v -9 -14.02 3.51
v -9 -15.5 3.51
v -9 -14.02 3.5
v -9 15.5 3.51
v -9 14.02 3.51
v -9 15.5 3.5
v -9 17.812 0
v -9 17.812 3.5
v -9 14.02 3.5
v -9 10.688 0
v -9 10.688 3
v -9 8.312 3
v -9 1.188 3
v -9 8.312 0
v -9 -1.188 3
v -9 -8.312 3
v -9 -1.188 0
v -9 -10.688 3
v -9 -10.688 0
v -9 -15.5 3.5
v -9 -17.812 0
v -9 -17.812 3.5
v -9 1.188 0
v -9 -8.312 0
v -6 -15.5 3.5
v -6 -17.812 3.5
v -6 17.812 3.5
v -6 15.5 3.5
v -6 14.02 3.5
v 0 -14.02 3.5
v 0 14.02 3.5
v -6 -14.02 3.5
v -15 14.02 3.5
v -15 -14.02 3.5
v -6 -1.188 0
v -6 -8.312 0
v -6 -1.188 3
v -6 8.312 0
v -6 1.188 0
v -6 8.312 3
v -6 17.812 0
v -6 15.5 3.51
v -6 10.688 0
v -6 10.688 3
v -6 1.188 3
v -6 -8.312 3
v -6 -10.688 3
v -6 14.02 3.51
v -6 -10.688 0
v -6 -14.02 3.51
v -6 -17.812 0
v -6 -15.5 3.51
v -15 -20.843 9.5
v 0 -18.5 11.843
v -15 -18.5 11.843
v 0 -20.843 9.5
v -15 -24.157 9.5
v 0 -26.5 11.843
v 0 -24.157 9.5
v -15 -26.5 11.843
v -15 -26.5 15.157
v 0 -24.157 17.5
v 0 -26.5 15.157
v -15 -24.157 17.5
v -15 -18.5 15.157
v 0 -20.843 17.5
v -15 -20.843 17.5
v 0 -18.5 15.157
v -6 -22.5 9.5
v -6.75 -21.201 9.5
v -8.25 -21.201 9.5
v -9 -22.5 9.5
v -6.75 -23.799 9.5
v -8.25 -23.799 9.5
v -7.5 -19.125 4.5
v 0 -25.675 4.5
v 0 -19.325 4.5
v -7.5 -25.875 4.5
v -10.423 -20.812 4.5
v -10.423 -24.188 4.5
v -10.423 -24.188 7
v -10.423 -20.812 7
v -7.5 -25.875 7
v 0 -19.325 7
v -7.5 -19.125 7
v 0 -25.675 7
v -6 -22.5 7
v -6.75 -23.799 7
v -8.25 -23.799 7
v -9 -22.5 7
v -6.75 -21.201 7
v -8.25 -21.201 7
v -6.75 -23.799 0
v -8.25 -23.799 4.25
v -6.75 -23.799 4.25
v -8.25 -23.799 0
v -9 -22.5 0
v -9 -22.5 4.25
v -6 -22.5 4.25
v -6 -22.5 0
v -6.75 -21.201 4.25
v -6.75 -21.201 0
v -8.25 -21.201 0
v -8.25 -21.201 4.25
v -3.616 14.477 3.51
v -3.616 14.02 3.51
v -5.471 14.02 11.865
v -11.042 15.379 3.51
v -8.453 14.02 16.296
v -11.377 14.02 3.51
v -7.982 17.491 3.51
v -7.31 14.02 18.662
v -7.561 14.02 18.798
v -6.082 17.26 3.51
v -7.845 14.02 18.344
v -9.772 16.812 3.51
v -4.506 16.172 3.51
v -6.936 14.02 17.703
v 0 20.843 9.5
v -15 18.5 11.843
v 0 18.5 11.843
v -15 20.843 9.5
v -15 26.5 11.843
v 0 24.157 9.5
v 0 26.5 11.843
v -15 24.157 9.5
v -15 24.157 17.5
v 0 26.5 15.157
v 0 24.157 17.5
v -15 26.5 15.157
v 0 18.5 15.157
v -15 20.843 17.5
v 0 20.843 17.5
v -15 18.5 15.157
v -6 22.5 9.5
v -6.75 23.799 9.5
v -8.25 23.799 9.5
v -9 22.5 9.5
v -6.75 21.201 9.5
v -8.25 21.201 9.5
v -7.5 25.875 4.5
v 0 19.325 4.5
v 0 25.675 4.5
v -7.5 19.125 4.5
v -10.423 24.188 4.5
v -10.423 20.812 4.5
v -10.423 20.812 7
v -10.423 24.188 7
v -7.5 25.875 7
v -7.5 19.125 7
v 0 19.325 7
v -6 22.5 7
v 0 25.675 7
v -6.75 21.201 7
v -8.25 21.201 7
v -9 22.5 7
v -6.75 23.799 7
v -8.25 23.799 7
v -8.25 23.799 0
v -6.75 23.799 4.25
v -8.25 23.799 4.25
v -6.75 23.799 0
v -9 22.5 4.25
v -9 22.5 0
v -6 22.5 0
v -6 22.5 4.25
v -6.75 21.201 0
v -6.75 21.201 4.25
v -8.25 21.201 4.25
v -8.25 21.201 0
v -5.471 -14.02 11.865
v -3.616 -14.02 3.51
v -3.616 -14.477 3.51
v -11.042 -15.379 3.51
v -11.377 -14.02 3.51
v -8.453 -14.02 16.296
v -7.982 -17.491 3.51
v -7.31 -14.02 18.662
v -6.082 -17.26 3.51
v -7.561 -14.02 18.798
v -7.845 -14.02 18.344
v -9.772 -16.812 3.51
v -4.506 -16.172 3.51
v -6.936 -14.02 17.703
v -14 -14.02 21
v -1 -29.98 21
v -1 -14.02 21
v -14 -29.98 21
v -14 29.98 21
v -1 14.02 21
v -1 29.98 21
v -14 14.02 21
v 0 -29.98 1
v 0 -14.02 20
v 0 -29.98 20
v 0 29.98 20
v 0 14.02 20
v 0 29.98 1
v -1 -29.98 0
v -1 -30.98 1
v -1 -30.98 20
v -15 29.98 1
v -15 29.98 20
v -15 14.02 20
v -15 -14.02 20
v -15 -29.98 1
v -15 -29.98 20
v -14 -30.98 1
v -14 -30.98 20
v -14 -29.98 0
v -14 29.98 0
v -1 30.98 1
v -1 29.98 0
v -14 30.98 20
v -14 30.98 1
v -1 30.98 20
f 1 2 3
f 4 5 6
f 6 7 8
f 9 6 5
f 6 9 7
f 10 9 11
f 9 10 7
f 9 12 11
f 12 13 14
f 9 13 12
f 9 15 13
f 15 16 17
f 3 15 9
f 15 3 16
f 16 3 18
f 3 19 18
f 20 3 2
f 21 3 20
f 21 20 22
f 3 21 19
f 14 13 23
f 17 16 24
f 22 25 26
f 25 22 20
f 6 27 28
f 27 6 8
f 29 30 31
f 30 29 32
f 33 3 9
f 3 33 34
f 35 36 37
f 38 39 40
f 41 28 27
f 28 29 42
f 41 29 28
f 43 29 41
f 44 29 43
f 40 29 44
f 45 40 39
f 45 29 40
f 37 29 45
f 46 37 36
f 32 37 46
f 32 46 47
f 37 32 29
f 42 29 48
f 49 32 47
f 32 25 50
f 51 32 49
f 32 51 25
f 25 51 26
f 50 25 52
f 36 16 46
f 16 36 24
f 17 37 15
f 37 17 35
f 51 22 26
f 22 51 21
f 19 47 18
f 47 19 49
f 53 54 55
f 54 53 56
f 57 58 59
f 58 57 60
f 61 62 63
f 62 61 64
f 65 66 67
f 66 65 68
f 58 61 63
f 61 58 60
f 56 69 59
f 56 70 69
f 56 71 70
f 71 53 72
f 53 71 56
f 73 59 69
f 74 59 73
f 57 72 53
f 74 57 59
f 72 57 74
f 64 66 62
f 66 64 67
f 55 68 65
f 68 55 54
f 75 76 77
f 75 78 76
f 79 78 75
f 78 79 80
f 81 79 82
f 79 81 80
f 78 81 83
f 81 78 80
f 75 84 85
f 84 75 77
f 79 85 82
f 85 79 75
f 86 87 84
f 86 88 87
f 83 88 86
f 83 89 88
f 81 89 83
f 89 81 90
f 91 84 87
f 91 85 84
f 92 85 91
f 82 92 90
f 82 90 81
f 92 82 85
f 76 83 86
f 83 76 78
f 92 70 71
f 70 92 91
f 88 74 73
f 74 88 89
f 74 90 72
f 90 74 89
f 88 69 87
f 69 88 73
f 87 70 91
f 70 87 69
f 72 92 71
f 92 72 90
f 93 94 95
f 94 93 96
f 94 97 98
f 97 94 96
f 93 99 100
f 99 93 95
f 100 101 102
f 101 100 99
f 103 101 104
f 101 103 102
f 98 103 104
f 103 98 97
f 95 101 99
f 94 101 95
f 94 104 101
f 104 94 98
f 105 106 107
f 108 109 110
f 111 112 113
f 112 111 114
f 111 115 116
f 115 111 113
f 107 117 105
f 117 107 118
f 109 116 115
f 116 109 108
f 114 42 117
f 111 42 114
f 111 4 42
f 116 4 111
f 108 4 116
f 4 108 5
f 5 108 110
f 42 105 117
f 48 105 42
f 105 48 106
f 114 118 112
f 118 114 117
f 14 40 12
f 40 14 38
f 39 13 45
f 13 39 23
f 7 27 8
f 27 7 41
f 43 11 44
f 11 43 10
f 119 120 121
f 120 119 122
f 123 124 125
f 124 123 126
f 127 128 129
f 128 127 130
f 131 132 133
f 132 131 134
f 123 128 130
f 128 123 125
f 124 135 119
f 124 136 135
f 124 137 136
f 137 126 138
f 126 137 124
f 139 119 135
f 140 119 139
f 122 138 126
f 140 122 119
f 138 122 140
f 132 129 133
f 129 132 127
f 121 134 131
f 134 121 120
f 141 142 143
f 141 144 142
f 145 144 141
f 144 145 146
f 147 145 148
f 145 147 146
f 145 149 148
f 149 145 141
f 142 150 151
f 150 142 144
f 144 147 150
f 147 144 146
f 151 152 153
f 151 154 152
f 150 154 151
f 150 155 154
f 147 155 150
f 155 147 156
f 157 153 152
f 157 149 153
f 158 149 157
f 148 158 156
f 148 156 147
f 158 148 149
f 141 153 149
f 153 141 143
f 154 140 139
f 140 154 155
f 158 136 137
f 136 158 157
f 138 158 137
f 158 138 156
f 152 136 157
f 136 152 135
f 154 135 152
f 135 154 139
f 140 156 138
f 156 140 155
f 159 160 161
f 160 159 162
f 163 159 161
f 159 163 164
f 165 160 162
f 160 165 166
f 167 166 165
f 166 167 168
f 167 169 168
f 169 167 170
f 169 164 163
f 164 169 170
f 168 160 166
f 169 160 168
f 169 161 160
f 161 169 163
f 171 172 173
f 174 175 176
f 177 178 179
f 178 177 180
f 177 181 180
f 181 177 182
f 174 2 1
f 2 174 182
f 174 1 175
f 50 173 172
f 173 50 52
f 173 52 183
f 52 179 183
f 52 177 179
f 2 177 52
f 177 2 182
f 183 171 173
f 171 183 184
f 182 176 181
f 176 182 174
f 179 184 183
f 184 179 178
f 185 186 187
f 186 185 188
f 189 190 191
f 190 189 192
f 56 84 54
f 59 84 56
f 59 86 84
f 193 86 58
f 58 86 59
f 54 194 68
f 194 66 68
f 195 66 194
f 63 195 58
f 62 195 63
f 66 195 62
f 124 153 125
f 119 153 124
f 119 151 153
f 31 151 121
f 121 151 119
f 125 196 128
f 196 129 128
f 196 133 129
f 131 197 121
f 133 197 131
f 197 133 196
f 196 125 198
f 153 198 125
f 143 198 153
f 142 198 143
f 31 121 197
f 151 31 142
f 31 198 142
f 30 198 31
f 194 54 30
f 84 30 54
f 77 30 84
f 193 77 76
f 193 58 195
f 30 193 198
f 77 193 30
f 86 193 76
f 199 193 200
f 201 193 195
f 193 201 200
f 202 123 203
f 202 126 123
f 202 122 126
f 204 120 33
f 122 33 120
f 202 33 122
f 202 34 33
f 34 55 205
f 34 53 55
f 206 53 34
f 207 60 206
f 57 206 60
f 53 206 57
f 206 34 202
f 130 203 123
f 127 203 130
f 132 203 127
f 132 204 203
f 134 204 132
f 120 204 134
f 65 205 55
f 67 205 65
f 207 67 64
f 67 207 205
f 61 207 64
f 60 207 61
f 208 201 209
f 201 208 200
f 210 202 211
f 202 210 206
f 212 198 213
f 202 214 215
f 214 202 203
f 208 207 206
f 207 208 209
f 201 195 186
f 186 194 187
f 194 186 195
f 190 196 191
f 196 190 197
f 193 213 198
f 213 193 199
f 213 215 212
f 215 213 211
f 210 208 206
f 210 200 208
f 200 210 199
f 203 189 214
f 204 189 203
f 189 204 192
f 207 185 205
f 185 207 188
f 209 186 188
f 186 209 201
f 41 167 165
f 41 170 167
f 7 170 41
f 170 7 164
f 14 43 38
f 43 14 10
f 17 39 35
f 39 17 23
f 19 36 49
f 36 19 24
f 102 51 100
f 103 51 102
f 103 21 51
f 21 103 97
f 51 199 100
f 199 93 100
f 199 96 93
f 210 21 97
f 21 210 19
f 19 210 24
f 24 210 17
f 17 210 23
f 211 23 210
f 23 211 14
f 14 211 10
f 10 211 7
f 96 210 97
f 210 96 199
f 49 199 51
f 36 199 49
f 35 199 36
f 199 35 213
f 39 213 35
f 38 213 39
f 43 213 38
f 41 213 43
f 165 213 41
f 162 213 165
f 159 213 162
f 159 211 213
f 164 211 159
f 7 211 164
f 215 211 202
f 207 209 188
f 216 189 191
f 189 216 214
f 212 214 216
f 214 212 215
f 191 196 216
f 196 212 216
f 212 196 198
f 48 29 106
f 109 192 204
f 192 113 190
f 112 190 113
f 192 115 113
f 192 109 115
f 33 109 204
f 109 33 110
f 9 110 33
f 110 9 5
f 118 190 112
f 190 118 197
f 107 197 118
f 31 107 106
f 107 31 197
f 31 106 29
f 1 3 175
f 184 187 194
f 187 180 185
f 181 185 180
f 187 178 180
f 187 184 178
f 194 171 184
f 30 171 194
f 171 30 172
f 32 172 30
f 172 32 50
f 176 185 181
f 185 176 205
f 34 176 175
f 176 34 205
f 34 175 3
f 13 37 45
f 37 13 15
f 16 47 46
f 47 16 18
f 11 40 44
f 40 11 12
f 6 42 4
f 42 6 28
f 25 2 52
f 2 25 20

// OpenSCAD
//////////////////////////////////////////////////////////////////////////////////////
///
///  I3XENDS - Split X-Ends for Prusa i3, with Endstop and Belt Tensioner
///
///  This file contains a redesign of the X-ends for the Prusa i3, including
///  motor end, idler end with belt tensioner and endstop.
///
///  The design goal is to make the X-ends stronger by splitting them into two
///  interlocking parts, printing the Z-axis related part vertically and the
///  X-axis relating part rotated 90 degrees to the back.  This way, each part
///  is printed in its optimal position, resulting in improved object strength
///  and reduced printing difficulties, such as warping and cracking. The two
///  part are joined by means of a trapezoidal slide and are locked firmly
///  together once the upped X-rod is inserted.
///
///  The idler bearing is mounted on a configurable fork which also acts as a
///  belt tensioner, being attached to the left X-end by means of an ajuster bolt.
///  Idler forks for the following bearing are predefined:
///     2x623ZZ, 2x604ZZ, 2x624Z, 2x625ZZ, 1x608ZZ
///
///  The motor X-end contains has the option for integrating a Z-endstop adjustment
///  screw.
///
///  Finally, the X-endstop holder is implemented a separate object which slides
///  on boths X-rods and is maintained firmly in its position bt means of two locking
///  screws.
///
///  The rod channels and screw holes are defined to be tight.  Use a drill with
///  the corresponding diameter to obtain perfectly fitting cavities.
///
//////////////////////////////////////////////////////////////////////////////////////
///
///  2014-10-24 Heinz Spiess, Switzerland
///
///  released under Creative Commons - Attribution - Share Alike licence (CC BY-SA)
//////////////////////////////////////////////////////////////////////////////////////

// extrusion specific parameters
ew = 0.56;    // extrusion width
eh = 0.25;    // layer height
epsgap = 0.1; // gap between complementing parts
wall = [6*ew, 8*ew, 14*eh, 4*ew]; // wall thickness x/y/z/lm8uu


// build a cube with chamfered edges
module chamfered_cube(size,d=[1,1,1]){
   hull(){
     translate([d[0],d[1],0])cube(size-2*[d[0],d[1],0]);
     translate([0,d[1],d[2]])cube(size-2*[0,d[1],d[2]]);
     translate([d[0],0,d[2]])cube(size-2*[d[0],0,d[2]]);
   }
}


// build a cylinder with chamfered edges
module chamfered_cylinder(r=0,r1=0,r2=0,h=0,d=1){
   hull(){
      translate([0,0,d])cylinder(r1=(r?r:r1),r2=(r>0?r:r2),h=h-2*d);
      cylinder(r1=(r?r:r1)-d,r2=(r>0?r:r2)-d,h=h);
   }
}


//////////////////////////////////////////////////////////////////////////////////////
///
///  The module i3_xend() contains all parts of the project as sub-modules. 
///  (This is convenient since this way, the parameters can easily be shared.)
///
//////////////////////////////////////////////////////////////////////////////////////
module i3_xend(
   motorend=true, 
   idlerend=false, 
   idler=false, 
   bearing=[5,17,11],
   endstop=false,
   zcarriage=true,
   support=true,
   idlerclamps=false,
   zclamps=false,
   xdist=45,       // distance between x-rods
   xrod=8,        // diameter of x-rods
   zsrod = 8,     // diameter of smooth z-rod
   ztrod=[5,8.2,5],// [diameter, nut_width, nut_height] of threaded z-rod
   ){
lm8uu = 14.9; // diameter of linear bearing;
lm8uuh = 25;  // length of linear bearing;
motor_d = 42; // motor side length (Nema 17)
motor_s = 31; // motor mounting screws spacing

madj = 2.5;   // screw hole for adjuster screw (cut thread with M3 tap)
m3 = 3;       // motor screw diameter
m3n = 5.5;    // M3 nut diameter
m3nh = 2.5;   // M3 nut height
zdist = motor_d/2-zsrod/2; // center-to-center distance between z-rods

idl = 20;     // idler length
idg = 0.25;   // gap for idler
ids = m3;      // idler tensioning screw diameter
idn = m3n;    // idler nut diameter
idnh = m3nh;   // idler nut height

xgap = 10-wall[0]-(lm8uu-xrod)/2;    // gap between x-motor and wall

esl = 15;     // endstop length (along x-rods)
esd = 9.5;    // endstop switch screw distance

//  don't change the following, they are just to make code more readble
ml1 = motor_d+xgap;                    // upper length of motor end left of origin
ml2 = lm8uu/2+2*wall[0]+zdist+ztrod[0];      // length of motor end right of origin
ml3 = motor_d/2-motor_s/4-m3+xgap;      // lower length of motor end left of origin
mlz = wall[0]+lm8uu/2;                  // x-position of smooth z-rod
d1 = 2*wall[2]+xrod;                    // height of main body
d2 = wall[2]+xrod-1;                    // height of motor base
h1 = xdist+2*wall[1]+xrod;              // total height

itl = ml2-idl-2*wall[0];                // idler tail length
idh = d1;     // idler height
ith = d1;                               // idler tail height
idd = d1;   // idler depth
idc = d1-1;
idca = -45;


///////////////////////////////////////////////////////////////////////////////
// local module for the interlocking Z-carriage part for motor and idler end
///////////////////////////////////////////////////////////////////////////////
module zcarriage(hole=true,l=h1,eps=0){
   assign(hh=min(h1/2-motor_d/2,10))
   translate([0,0,-eps])difference(){
      union(){
         // outer cylinder for linear bearing holder
         cylinder(r=lm8uu/2+wall[3]+eps,h=l+2*eps);
	 if(zclamps)
	 for(z=[lm8uuh/2+m3,l-lm8uuh/2-m3]) rotate(210+90)
	      translate([lm8uu/2+wall[3]-2,-wall[3]-1,z])
	          rotate([-90,0,0])rotate(-18)for(zz=[0,wall[3]+2])
		     translate([0,0,zz])
		        cylinder(r=m3+2*wall[3]+1,h=wall[3],$fn=70);
	 // locking rail
         hull(){
            translate([-lm8uu/2-wall[3]-eps,-lm8uu/2-eps,0])cube([ew+2*eps,lm8uu+2*eps,l+2*eps]);
            translate([-lm8uu/2-eps,-lm8uu/2+wall[3]-eps,0])cube([ew+2*eps,lm8uu-2*wall[3]+2*eps,l+2*eps]);
         }
	 // upper x-rod lock
         translate([-lm8uu/2-d1-eps,-lm8uu-eps,0-eps])chamfered_cube([d1+2*eps,lm8uu+2*eps,d1-1+2*eps],[1,0,1]);
	 // nut holder for threaded z-rod
	 hull(){
	   translate([0,-zdist,0])rotate(30)chamfered_cylinder(r=lm8uu/2+1,h=hh,$fn=6);
	   translate([-lm8uu/2-wall[3],-ml2+mlz-eps+0.01,0])chamfered_cube([wall[3],ml2-mlz+2*eps,hh],[0,1,1]);
	 }
      }
      // lock for nut holder
      hull(){
         translate([-lm8uu/2-wall[2]-0.1,-ml2+mlz,wall[2]+0.5+eps])cube([1,ml2-mlz-lm8uu,hh],[0,1,1]);
         translate([-lm8uu/2-1,-ml2+mlz-1,wall[2]-1+eps])cube([1.01,ml2-mlz-lm8uu+1,hh],[0,1,1]);
      }
      // cavities
      if(hole){
         // cavity for linear bearings
         translate([0,0,-1])cylinder(r=lm8uu/2-ew/2,h=l+2);
	 // upper linear bearing
         translate([0,0,l-lm8uuh])cylinder(r=lm8uu/2,h=lm8uuh+1);
	 // lower linear bearing
         translate([0,0,-1])cylinder(r=lm8uu/2,h=lm8uuh+1);
	 // middle part
	 if(2*lm8uu<l-7)
            translate([0,0,lm8uuh+2])cylinder(r=lm8uu/2,h=l-2*lm8uuh-4);
	 // longitudinal cutout to allow flexing
         rotate(210)translate([-1,0,-1])cube([2,lm8uu/2+wall[3]+0.1,l+2]);
	 if(zclamps)
	 for(z=[lm8uuh/2+m3,l-lm8uuh/2-m3]) rotate(210+90)
	      translate([lm8uu/2+m3+wall[3]-0.5,-wall[3]-2,z])
	          rotate([-90,0,0])rotate(30)for(zz=[0,wall[3]+2])
		        cylinder(r=m3/2,h=2*wall[3]+2+2,$fn=6);
	 // x-rod hole throu x-rod lock
         translate([-lm8uu/2-d1/2,1,wall[1]+xrod/2])rotate([90,0,0])rotate(22.5)cylinder(r=xrod/2/cos(22.5),h=lm8uu+2,$fn=8);
	 // hole for threaded z-rod
	 //%color("grey")translate([0,-zdist,-1])cylinder(r=ztrod[0]/2,h=h1+2,$fn=12);
	 translate([0,-zdist,-1])cylinder(r=ztrod[0]/2,h=h1/2-motor_d/2+2,$fn=12);
	 // nut cavity for threaded z-rod
	 translate([0,-zdist,hh-ztrod[2]])rotate(30)cylinder(r=ztrod[1]/2/cos(30),h=ztrod[2]+1,$fn=6);
      }
   }
}


///////////////////////////////////////////////////////////////////////////////
// local module to build the base of the motor end
///////////////////////////////////////////////////////////////////////////////
module motorend(){
difference(){
union(){
difference(){
   union(){
      // main body upper part
      hull(){
         translate([-ml1,-1,0])
            chamfered_cube([ml1+ml2,min(motor_d/2+3,h1/2+1),d2]);
         translate([-ml3,-1,0])
            chamfered_cube([ml3+ml2,h1/2+1,d1]);
      }
      // main body lower part
      translate([-ml3,-h1/2,0])
         chamfered_cube([ml3+ml2,h1/2+2,d1]);
      // z-adjuster screw base
      if(endstop)
         hull()for(xz=[[0,d1/2,6],[0,d1+lm8uu/2,36],[10,d1-5,6]])
            translate([-motor_d/2-xgap+motor_s/2+xz[0],-h1/2,xz[1]])rotate([-90,0,0])
               chamfered_cylinder(r=motor_s/2-motor_s/4-m3,h=min(h1/2-motor_d/2,xrod+wall[1]),$fn=xz[2]);
               //chamfered_cylinder(r=motor_s/2-motor_s/4-m3,h=h1/2-motor_d/2,$fn=xz[2]);

   }

   for(sy=[-1,1])scale([1,sy,1]){
      // x-rod holes
      translate([0,xdist/2,d1/2])rotate([0,90,0])rotate(22.5)cylinder(r=xrod/2/cos(22.5),h=ml2+1,$fn=8);
      // holes for motor screws
      for(fx=[-1,1])translate([-xgap-motor_d/2+fx*motor_s/2,motor_s/2,-1]){
         // main screw holes
         cylinder(r=m3/2,h=d2+1,$fn=6);
         // cavities for screw heads
	 translate([0,0,7]) cylinder(r=m3,h=d1+2,$fn=12);
      }
   }
   
   // main belt channel 
   translate([-motor_d-xgap-1,-motor_d/4,wall[2]])
      cube([motor_d+xgap+ml2+2,motor_d/2,xrod]);
   translate([0,0,0])hull(){
      translate([-xgap-wall[0],-motor_d/4,wall[2]])
         cube([xgap+ml2+2,motor_d/2,xrod]);
      translate([0,-motor_s/2+2,wall[2]])
         cube([ml2+2,motor_s-4,xrod]);
   }
   for(sy=[-1,1])scale([1,sy,1])
      translate([0,-xdist/2+xrod/2+wall[1],wall[2]])
         cube([ml2+2,xdist/2-xrod/2-wall[1]-motor_s/2,xrod]);
   // upper motor cavity
   translate([-motor_d-xgap-1,-motor_d/2,d2])
      cube([motor_d+xgap,motor_d,wall[2]+2]);
   //main cutout for motor
   translate([-motor_d-xgap-1,-motor_d/4,-1])
      cube([motor_d,motor_d/2,wall[2]+xrod+2]);
   // octogonal cutout centered on motor axis
   translate([-xgap-motor_d/2,0,0])hull()for(a=[0,90])rotate(a)
      cube([motor_d/2,motor_s-2,motor_d],true);

    // Z-adjuster screw hole
    if(endstop)
       translate([-motor_d/2-xgap+motor_s/2,-h1/2,d1+lm8uu/2])rotate([-90,0,0])
          translate([0,0,-1])cylinder(r=madj/2,h=h1/2+wall[1]-motor_d/2+2,$fn=6);
}
 
    // belt separating wall 
    translate([0,-wall[1]/2,0])chamfered_cube([ml2,wall[1],d1]);
}
   // cutout for linear bearings holder
    translate([wall[0]+lm8uu/2,h1/2,d1+lm8uu/2])rotate([90,0,0])
       rotate(90){
          zcarriage(hole=false,eps=epsgap);
          if(!support)%color("cyan")zcarriage(hole=true);
       }

}

    if(zcarriage)translate([-motor_d+xgap,0,0])rotate(90)
       zcarriage(hole=true);
}

///////////////////////////////////////////////////////////////////////////////
// local module to build the idler fork for the specified bearing parameters
//    bearing[0]   inner diameter (axis)
//    bearing[1]   outer diameter (incl. belt)
//    bearing[2]   width of bearing (incl. washers)
///////////////////////////////////////////////////////////////////////////////
module idler(){
   assign(idD = bearing[2]+2*wall[2])
   assign(idE = bearing[1]/2)
   difference(){
      union(){
         // main body
	 hull(){
            translate([0,-idd/2,0])chamfered_cube([idl,idd,idh]);
            translate([-idE-2,-idD/2,0])chamfered_cube([idl/2+idE,idD,idh]);
	    // front end
            translate([-idE+1,-idD/2,idh/2])rotate([-90,0,0])rotate(0)chamfered_cylinder(r=idh/2,h=idD);
	 }
	 // tail
         translate([0,-idd/2+wall[2]+epsgap,0])chamfered_cube([ml2-2*wall[0],idd-2*wall[2]-2*epsgap,idh]);
      }
      // hole tensioning screw
      translate([-1,0,d1/2])rotate([0,90,0])rotate(30)cylinder(r=ids/2,h=ml2+2,$fn=6);
      // axis hole
      translate([-idE+bearing[0]/2,-idD/2-1,d1/2])rotate([-90,0,0])cylinder(r=bearing[0]/2,h=idD+2);
      hull(){
         // bearing cavity 
         translate([-idE+2,-bearing[2]/2,d1/2])rotate([-90,0,0])cylinder(r=max(bearing[1],idh/cos(30)+2)/2,h=bearing[2]);
         // main cavity
         translate([-idd-1,-idd/2+wall[1],-1])chamfered_cube([idd+idl-wall[0]+1,idd-2*wall[1],idh+2]);
      }
      // tensioning nut cage
      hull()for(y=[0,xrod])translate([(idl+ml2-3*wall[1])/2,y,d1/2])rotate([0,90,0])
         rotate(30)cylinder(r=idn/2/cos(30)+(y?0.4:0),h=idnh,$fn=6);
   }
     
}

///////////////////////////////////////////////////////////////////////////////
// local module to build the idler X-end
///////////////////////////////////////////////////////////////////////////////
module idlerend(){
   difference(){
      union(){
         // main body
         translate([0,-h1/2,0]) chamfered_cube([ml2,h1,d1]);
	 // idler clamp screws
	 if(idlerclamps)for(sy=[-1,1])scale([1,sy,1]){
	     translate([ml2-idc/2,-xdist/2,d1/2])rotate([idca,0,0])chamfered_cylinder(r=idc/2,h=d1/2+m3nh+wall[2],d=2,$fn=36);
	 }
      }
   
      for(sy=[-1,1])scale([1,sy,1]){
         // x-rod holes
         translate([-1,xdist/2,d1/2])rotate([0,90,0])rotate(22.5)cylinder(r=xrod/2/cos(22.5),h=ml2+2,$fn=8);
      }
      
      // idler clamp screw
      if(idlerclamps)for(sy=[-1,1])scale([1,sy,1])
         translate([ml2-idc/2,-xdist/2,d1/2])rotate([idca,0,0]){
           // idler clamp screw head cavity (if needed)
	   cylinder(r=m3/2,h=d1/2+m3nh+wall[2]+3,$fn=6);
           // idler clamp screw holes
	   translate([0,0,d1/2+m3nh+wall[2]+0.01])cylinder(r=m3,h=d1/2+m3nh+wall[2]+3,$fn=12);
           // idler clamp screw nut traps
	   hull()for(x=[0,idc/2+.1])translate([x,0,xrod/2+wall[2]-1-epsgap/2])
	      cylinder(r=m3n/2+(x?0.35:epsgap),h=m3nh+epsgap,$fn=6);
      }
      // main belt channel 
      translate([-1,-motor_s/2+(idlerclamps?3.5:2),wall[2]-eh])
         cube([ml2+2,motor_s-(idlerclamps?7:4),xrod+eh]);
      translate([-1,-xdist/2+xrod/2+wall[1]+(idlerclamps?3.5:2),wall[2]-eh])
         cube([ml2+2,xdist-xrod-2*wall[1]-(idlerclamps?7:4),xrod+eh]);
   
      // idler cut-out
      translate([ml2-idl-idg,-idh/2-idg,-0.01])chamfered_cube([idl+10,idh+2*idg,d1+0.02],[1,0,1]);
   
 
      // cutout for linear bearings holder
      translate([wall[0]+lm8uu/2,h1/2,d1+lm8uu/2])rotate([90,0,0])
         rotate(90){
            zcarriage(hole=false,eps=epsgap);
            if(!support)%color("cyan")zcarriage(hole=true);
         }

   }
   // idler support structure (cut away after printing!)
   if(support)color("red")difference(){
      union(){
         translate([ml2-idl-2,-idh/2-2,d1-wall[2]])cube([idl+2,idh+4,eh]);
         translate([ml2-idl+1,-idh/2+1,0])cube([idl-1,idh-2,d1-wall[2]]);
      }
      translate([ml2-idl+1+2,-idh/2+1+2,-1])cube([idl-1,idh-2-4,d1-wall[2]+2]);
   }else{  // draw idler
      %color("green")translate([ml2+5,idd/2,idh/2])rotate([90,0,0])rotate(180)idler();
   }

   // tail cage for idler fork
   difference(){
      translate([0,-ith/2-wall[1]+(idlerclamps?1:0),wall[2]-eh-0.01])cube([ml2-idl,ith+2*wall[1]-(idlerclamps?2:0),xrod+eh+0.02]);
      translate([2*wall[0],-ith/2-idg,wall[2]])cube([ml2-idl-2*wall[0]+1,ith+2*idg,xrod]);
      translate([-1,0,d1/2])rotate([0,90,0])cylinder(r=ids/2,h=2*wall[0]+2);
   }

    
   // build separate interlocking z-carriage part
   if(zcarriage)translate([-2*lm8uu,h1/3,0]) rotate(90)zcarriage(hole=true);
}

///////////////////////////////////////////////////////////////////////////////
// local module to build the X-endstop
///////////////////////////////////////////////////////////////////////////////
module endstop(){
   rotate([0,support?0:180,0])translate([0,0,support?0:-(d1+m3nh+wall[2])])
   difference(){
      union(){
         // main body upper part
         translate([0,-h1/2,0]) chamfered_cube([esl,h1,d1+m3nh+wall[2]]);
      }

      for(sy=[-1,1])scale([1,sy,1]){
         // x-rod holes
         translate([-1,xdist/2,d1/2])rotate([0,90,0])
            rotate(22.5)cylinder(r=xrod/2/cos(22.5),h=esl+2,$fn=8);
         // x-rod nut cavities
         hull()for(x=[0,esl/2])translate([x,xdist/2,d1-1])
            rotate(30)cylinder(r=m3n/2/cos(30)+(x?0.2:0),h=m3nh,$fn=6);
         // x-rod clamping screw holes - lower part
         translate([esl/2,xdist/2,d1-wall[2]])cylinder(r=m3/2,h=wall[2],$fn=6);
         // x-rod clamping screw holes - upper part
         translate([esl/2,xdist/2,d1+m3nh-1+eh])cylinder(r=m3/2,h=wall[2]+2,$fn=6);
         // end switch screw slots
         for(i=[0:1])translate([esl/2-m3/2,i*esd+esd/8,d1+m3nh])
            cube([m3,0.75*esd,wall[2]+1]);
         translate([esl/2,-xdist/2+xrod/2+wall[1]+0.5,0])cylinder(r1=0,r2=m3+1,h=d1+m3nh-0.01);
      }
         
      // belt channel 
      translate([-1,-xdist/2+xrod/2+wall[1],-1])
         cube([ml2+2,xdist-xrod-2*wall[1],xrod+2*wall[2]+m3nh+1]);
      translate([esl/2-m3/2,-motor_s/2,d1+m3nh-eh])
         cube([m3,motor_s,3*eh]);
   }
   // bridging support  
   if(support)color("red")hull(){
      translate([2,-2,0])cube([esl-4,4,1]);
      translate([-1,-ew/2,d1+m3nh-1])cube([esl+2,ew,1]);
   }

}
   
//  now build the desired part(s)

if(motorend)motorend();

if(endstop && !motorend)endstop();

if(idlerend)
   scale([-1,1,1])idlerend();
if(idler)
   translate([35,20,0])rotate(180)idler();

if(zcarriage && !motorend && !idlerend && !endstop &&!idler)zcarriage();

}

//////////////////////////////////////////////////////////////////////////////
///  Modules for automatic building of specific STL file via Makefile
//////////////////////////////////////////////////////////////////////////////

module motorxend(){ // AUTO_MAKE_STL
   i3_xend(motorend=true,idlerend=false,idler=false);
}

module motorxend_zendstop(){ // AUTO_MAKE_STL
   i3_xend(motorend=true,idlerend=false,idler=false,endstop=true);
}

module idlerxend(){ // AUTO_MAKE_STL
   i3_xend(motorend=false,idlerend=true,idler=false);
}

module idlerxend_xrodclamps(){ // AUTO_MAKE_STL
   i3_xend(motorend=false,idlerend=true,idler=false,idlerclamps=true);
}

module xendstop(){ // AUTO_MAKE_STL
   i3_xend(motorend=false,idlerend=false,idler=false,support=false,endstop=true);
}

module idler2x625(){ // AUTO_MAKE_STL
   i3_xend(motorend=false,idlerend=false,idler=true,bearing=[5,17,11]);
}

module idler2x686(){ // AUTO_MAKE_STL
   i3_xend(motorend=false,idlerend=false,idler=true,bearing=[6,16,11]);
}

module idler2x624(){ // AUTO_MAKE_STL
   i3_xend(motorend=false,idlerend=false,idler=true,bearing=[4,14,11]);
}

module idler2x623(){ // AUTO_MAKE_STL
   i3_xend(motorend=false,idlerend=false,idler=true,bearing=[3,11,9]);
}

module idler2x604(){ // AUTO_MAKE_STL
   i3_xend(motorend=false,idlerend=false,idler=true,bearing=[4,13,9]);
}

module idler608(){ // AUTO_MAKE_STL
   i3_xend(motorend=false,idlerend=false,idler=true,bearing=[8,18,8]);
}

module motorxend60_zendstop(){ // AUTO_MAKE_STL
   i3_xend(motorend=true,idlerend=false,idler=false,endstop=true,zclamps=false,xdist=60,ztrod=[6,10.2,5]);
}

module idlerxend60(){ // AUTO_MAKE_STL
   i3_xend(motorend=false,idlerend=true,idler=false,idlerclamps=false,zclamps=false,xdist=60,ztrod=[6,10.2,5]);
}

module idlerxend60_xrodclamps(){ // AUTO_MAKE_STL
   i3_xend(motorend=false,idlerend=true,idler=false,idlerclamps=true,zclamps=false,xdist=60,ztrod=[6,10.2,5]);
}

module xendstop60(){ // AUTO_MAKE_STL
   i3_xend(motorend=false,idlerend=false,idler=false,support=false,endstop=true,xdist=60);
}


//////////////////////////////////////////////////////////////////////////////
///  Uncomment as needed for manual printing
//////////////////////////////////////////////////////////////////////////////

//i3_xend(motorend=false,idlerend=true,idler=false,support=true,zcarriage=false,idlerclamps=true);
//scale([-1,1,1])i3_xend(motorend=false,idlerend=false,idler=false,support=false,zcarriage=true,idlerclamps=false);
//idlerxend();
//motorxend();
//motorxend_zendstop();
//idlerxend_xrodclamps();
//motorxend60_zendstop();
//idlerxend60_xrodclamps();
xendstop();
//idler2x625();
//idler2x623();
//idler2x604();
//idler608();
//
/// show all in print position:
//motorxend_zendstop();
//translate([55,0,0])xendstop();
//translate([120,0,0])idlerxend();
//translate([110,-45,0])rotate(180)idler2x604();
//
/// show all in working position:
//rotate(180)translate([30,90,0])
//{translate([-50,0,0])i3_xend(motorend=true,idlerend=false,idler=false,support=false,zcarriage=false);
//translate([85,0,0])i3_xend(motorend=false,idlerend=true,idler=false,support=false,zcarriage=false);
//i3_xend(motorend=false,idlerend=false,endstop=true,support=false,zcarriage=false);}
//translate([-50,0,0])i3_xend(motorend=true,idlerend=false,idler=false,support=false,zcarriage=false);
//translate([85,0,0])i3_xend(motorend=false,idlerend=true,idler=false,support=false,zcarriage=false);
//i3_xend(motorend=false,idlerend=false,endstop=true,support=false,zcarriage=false);
